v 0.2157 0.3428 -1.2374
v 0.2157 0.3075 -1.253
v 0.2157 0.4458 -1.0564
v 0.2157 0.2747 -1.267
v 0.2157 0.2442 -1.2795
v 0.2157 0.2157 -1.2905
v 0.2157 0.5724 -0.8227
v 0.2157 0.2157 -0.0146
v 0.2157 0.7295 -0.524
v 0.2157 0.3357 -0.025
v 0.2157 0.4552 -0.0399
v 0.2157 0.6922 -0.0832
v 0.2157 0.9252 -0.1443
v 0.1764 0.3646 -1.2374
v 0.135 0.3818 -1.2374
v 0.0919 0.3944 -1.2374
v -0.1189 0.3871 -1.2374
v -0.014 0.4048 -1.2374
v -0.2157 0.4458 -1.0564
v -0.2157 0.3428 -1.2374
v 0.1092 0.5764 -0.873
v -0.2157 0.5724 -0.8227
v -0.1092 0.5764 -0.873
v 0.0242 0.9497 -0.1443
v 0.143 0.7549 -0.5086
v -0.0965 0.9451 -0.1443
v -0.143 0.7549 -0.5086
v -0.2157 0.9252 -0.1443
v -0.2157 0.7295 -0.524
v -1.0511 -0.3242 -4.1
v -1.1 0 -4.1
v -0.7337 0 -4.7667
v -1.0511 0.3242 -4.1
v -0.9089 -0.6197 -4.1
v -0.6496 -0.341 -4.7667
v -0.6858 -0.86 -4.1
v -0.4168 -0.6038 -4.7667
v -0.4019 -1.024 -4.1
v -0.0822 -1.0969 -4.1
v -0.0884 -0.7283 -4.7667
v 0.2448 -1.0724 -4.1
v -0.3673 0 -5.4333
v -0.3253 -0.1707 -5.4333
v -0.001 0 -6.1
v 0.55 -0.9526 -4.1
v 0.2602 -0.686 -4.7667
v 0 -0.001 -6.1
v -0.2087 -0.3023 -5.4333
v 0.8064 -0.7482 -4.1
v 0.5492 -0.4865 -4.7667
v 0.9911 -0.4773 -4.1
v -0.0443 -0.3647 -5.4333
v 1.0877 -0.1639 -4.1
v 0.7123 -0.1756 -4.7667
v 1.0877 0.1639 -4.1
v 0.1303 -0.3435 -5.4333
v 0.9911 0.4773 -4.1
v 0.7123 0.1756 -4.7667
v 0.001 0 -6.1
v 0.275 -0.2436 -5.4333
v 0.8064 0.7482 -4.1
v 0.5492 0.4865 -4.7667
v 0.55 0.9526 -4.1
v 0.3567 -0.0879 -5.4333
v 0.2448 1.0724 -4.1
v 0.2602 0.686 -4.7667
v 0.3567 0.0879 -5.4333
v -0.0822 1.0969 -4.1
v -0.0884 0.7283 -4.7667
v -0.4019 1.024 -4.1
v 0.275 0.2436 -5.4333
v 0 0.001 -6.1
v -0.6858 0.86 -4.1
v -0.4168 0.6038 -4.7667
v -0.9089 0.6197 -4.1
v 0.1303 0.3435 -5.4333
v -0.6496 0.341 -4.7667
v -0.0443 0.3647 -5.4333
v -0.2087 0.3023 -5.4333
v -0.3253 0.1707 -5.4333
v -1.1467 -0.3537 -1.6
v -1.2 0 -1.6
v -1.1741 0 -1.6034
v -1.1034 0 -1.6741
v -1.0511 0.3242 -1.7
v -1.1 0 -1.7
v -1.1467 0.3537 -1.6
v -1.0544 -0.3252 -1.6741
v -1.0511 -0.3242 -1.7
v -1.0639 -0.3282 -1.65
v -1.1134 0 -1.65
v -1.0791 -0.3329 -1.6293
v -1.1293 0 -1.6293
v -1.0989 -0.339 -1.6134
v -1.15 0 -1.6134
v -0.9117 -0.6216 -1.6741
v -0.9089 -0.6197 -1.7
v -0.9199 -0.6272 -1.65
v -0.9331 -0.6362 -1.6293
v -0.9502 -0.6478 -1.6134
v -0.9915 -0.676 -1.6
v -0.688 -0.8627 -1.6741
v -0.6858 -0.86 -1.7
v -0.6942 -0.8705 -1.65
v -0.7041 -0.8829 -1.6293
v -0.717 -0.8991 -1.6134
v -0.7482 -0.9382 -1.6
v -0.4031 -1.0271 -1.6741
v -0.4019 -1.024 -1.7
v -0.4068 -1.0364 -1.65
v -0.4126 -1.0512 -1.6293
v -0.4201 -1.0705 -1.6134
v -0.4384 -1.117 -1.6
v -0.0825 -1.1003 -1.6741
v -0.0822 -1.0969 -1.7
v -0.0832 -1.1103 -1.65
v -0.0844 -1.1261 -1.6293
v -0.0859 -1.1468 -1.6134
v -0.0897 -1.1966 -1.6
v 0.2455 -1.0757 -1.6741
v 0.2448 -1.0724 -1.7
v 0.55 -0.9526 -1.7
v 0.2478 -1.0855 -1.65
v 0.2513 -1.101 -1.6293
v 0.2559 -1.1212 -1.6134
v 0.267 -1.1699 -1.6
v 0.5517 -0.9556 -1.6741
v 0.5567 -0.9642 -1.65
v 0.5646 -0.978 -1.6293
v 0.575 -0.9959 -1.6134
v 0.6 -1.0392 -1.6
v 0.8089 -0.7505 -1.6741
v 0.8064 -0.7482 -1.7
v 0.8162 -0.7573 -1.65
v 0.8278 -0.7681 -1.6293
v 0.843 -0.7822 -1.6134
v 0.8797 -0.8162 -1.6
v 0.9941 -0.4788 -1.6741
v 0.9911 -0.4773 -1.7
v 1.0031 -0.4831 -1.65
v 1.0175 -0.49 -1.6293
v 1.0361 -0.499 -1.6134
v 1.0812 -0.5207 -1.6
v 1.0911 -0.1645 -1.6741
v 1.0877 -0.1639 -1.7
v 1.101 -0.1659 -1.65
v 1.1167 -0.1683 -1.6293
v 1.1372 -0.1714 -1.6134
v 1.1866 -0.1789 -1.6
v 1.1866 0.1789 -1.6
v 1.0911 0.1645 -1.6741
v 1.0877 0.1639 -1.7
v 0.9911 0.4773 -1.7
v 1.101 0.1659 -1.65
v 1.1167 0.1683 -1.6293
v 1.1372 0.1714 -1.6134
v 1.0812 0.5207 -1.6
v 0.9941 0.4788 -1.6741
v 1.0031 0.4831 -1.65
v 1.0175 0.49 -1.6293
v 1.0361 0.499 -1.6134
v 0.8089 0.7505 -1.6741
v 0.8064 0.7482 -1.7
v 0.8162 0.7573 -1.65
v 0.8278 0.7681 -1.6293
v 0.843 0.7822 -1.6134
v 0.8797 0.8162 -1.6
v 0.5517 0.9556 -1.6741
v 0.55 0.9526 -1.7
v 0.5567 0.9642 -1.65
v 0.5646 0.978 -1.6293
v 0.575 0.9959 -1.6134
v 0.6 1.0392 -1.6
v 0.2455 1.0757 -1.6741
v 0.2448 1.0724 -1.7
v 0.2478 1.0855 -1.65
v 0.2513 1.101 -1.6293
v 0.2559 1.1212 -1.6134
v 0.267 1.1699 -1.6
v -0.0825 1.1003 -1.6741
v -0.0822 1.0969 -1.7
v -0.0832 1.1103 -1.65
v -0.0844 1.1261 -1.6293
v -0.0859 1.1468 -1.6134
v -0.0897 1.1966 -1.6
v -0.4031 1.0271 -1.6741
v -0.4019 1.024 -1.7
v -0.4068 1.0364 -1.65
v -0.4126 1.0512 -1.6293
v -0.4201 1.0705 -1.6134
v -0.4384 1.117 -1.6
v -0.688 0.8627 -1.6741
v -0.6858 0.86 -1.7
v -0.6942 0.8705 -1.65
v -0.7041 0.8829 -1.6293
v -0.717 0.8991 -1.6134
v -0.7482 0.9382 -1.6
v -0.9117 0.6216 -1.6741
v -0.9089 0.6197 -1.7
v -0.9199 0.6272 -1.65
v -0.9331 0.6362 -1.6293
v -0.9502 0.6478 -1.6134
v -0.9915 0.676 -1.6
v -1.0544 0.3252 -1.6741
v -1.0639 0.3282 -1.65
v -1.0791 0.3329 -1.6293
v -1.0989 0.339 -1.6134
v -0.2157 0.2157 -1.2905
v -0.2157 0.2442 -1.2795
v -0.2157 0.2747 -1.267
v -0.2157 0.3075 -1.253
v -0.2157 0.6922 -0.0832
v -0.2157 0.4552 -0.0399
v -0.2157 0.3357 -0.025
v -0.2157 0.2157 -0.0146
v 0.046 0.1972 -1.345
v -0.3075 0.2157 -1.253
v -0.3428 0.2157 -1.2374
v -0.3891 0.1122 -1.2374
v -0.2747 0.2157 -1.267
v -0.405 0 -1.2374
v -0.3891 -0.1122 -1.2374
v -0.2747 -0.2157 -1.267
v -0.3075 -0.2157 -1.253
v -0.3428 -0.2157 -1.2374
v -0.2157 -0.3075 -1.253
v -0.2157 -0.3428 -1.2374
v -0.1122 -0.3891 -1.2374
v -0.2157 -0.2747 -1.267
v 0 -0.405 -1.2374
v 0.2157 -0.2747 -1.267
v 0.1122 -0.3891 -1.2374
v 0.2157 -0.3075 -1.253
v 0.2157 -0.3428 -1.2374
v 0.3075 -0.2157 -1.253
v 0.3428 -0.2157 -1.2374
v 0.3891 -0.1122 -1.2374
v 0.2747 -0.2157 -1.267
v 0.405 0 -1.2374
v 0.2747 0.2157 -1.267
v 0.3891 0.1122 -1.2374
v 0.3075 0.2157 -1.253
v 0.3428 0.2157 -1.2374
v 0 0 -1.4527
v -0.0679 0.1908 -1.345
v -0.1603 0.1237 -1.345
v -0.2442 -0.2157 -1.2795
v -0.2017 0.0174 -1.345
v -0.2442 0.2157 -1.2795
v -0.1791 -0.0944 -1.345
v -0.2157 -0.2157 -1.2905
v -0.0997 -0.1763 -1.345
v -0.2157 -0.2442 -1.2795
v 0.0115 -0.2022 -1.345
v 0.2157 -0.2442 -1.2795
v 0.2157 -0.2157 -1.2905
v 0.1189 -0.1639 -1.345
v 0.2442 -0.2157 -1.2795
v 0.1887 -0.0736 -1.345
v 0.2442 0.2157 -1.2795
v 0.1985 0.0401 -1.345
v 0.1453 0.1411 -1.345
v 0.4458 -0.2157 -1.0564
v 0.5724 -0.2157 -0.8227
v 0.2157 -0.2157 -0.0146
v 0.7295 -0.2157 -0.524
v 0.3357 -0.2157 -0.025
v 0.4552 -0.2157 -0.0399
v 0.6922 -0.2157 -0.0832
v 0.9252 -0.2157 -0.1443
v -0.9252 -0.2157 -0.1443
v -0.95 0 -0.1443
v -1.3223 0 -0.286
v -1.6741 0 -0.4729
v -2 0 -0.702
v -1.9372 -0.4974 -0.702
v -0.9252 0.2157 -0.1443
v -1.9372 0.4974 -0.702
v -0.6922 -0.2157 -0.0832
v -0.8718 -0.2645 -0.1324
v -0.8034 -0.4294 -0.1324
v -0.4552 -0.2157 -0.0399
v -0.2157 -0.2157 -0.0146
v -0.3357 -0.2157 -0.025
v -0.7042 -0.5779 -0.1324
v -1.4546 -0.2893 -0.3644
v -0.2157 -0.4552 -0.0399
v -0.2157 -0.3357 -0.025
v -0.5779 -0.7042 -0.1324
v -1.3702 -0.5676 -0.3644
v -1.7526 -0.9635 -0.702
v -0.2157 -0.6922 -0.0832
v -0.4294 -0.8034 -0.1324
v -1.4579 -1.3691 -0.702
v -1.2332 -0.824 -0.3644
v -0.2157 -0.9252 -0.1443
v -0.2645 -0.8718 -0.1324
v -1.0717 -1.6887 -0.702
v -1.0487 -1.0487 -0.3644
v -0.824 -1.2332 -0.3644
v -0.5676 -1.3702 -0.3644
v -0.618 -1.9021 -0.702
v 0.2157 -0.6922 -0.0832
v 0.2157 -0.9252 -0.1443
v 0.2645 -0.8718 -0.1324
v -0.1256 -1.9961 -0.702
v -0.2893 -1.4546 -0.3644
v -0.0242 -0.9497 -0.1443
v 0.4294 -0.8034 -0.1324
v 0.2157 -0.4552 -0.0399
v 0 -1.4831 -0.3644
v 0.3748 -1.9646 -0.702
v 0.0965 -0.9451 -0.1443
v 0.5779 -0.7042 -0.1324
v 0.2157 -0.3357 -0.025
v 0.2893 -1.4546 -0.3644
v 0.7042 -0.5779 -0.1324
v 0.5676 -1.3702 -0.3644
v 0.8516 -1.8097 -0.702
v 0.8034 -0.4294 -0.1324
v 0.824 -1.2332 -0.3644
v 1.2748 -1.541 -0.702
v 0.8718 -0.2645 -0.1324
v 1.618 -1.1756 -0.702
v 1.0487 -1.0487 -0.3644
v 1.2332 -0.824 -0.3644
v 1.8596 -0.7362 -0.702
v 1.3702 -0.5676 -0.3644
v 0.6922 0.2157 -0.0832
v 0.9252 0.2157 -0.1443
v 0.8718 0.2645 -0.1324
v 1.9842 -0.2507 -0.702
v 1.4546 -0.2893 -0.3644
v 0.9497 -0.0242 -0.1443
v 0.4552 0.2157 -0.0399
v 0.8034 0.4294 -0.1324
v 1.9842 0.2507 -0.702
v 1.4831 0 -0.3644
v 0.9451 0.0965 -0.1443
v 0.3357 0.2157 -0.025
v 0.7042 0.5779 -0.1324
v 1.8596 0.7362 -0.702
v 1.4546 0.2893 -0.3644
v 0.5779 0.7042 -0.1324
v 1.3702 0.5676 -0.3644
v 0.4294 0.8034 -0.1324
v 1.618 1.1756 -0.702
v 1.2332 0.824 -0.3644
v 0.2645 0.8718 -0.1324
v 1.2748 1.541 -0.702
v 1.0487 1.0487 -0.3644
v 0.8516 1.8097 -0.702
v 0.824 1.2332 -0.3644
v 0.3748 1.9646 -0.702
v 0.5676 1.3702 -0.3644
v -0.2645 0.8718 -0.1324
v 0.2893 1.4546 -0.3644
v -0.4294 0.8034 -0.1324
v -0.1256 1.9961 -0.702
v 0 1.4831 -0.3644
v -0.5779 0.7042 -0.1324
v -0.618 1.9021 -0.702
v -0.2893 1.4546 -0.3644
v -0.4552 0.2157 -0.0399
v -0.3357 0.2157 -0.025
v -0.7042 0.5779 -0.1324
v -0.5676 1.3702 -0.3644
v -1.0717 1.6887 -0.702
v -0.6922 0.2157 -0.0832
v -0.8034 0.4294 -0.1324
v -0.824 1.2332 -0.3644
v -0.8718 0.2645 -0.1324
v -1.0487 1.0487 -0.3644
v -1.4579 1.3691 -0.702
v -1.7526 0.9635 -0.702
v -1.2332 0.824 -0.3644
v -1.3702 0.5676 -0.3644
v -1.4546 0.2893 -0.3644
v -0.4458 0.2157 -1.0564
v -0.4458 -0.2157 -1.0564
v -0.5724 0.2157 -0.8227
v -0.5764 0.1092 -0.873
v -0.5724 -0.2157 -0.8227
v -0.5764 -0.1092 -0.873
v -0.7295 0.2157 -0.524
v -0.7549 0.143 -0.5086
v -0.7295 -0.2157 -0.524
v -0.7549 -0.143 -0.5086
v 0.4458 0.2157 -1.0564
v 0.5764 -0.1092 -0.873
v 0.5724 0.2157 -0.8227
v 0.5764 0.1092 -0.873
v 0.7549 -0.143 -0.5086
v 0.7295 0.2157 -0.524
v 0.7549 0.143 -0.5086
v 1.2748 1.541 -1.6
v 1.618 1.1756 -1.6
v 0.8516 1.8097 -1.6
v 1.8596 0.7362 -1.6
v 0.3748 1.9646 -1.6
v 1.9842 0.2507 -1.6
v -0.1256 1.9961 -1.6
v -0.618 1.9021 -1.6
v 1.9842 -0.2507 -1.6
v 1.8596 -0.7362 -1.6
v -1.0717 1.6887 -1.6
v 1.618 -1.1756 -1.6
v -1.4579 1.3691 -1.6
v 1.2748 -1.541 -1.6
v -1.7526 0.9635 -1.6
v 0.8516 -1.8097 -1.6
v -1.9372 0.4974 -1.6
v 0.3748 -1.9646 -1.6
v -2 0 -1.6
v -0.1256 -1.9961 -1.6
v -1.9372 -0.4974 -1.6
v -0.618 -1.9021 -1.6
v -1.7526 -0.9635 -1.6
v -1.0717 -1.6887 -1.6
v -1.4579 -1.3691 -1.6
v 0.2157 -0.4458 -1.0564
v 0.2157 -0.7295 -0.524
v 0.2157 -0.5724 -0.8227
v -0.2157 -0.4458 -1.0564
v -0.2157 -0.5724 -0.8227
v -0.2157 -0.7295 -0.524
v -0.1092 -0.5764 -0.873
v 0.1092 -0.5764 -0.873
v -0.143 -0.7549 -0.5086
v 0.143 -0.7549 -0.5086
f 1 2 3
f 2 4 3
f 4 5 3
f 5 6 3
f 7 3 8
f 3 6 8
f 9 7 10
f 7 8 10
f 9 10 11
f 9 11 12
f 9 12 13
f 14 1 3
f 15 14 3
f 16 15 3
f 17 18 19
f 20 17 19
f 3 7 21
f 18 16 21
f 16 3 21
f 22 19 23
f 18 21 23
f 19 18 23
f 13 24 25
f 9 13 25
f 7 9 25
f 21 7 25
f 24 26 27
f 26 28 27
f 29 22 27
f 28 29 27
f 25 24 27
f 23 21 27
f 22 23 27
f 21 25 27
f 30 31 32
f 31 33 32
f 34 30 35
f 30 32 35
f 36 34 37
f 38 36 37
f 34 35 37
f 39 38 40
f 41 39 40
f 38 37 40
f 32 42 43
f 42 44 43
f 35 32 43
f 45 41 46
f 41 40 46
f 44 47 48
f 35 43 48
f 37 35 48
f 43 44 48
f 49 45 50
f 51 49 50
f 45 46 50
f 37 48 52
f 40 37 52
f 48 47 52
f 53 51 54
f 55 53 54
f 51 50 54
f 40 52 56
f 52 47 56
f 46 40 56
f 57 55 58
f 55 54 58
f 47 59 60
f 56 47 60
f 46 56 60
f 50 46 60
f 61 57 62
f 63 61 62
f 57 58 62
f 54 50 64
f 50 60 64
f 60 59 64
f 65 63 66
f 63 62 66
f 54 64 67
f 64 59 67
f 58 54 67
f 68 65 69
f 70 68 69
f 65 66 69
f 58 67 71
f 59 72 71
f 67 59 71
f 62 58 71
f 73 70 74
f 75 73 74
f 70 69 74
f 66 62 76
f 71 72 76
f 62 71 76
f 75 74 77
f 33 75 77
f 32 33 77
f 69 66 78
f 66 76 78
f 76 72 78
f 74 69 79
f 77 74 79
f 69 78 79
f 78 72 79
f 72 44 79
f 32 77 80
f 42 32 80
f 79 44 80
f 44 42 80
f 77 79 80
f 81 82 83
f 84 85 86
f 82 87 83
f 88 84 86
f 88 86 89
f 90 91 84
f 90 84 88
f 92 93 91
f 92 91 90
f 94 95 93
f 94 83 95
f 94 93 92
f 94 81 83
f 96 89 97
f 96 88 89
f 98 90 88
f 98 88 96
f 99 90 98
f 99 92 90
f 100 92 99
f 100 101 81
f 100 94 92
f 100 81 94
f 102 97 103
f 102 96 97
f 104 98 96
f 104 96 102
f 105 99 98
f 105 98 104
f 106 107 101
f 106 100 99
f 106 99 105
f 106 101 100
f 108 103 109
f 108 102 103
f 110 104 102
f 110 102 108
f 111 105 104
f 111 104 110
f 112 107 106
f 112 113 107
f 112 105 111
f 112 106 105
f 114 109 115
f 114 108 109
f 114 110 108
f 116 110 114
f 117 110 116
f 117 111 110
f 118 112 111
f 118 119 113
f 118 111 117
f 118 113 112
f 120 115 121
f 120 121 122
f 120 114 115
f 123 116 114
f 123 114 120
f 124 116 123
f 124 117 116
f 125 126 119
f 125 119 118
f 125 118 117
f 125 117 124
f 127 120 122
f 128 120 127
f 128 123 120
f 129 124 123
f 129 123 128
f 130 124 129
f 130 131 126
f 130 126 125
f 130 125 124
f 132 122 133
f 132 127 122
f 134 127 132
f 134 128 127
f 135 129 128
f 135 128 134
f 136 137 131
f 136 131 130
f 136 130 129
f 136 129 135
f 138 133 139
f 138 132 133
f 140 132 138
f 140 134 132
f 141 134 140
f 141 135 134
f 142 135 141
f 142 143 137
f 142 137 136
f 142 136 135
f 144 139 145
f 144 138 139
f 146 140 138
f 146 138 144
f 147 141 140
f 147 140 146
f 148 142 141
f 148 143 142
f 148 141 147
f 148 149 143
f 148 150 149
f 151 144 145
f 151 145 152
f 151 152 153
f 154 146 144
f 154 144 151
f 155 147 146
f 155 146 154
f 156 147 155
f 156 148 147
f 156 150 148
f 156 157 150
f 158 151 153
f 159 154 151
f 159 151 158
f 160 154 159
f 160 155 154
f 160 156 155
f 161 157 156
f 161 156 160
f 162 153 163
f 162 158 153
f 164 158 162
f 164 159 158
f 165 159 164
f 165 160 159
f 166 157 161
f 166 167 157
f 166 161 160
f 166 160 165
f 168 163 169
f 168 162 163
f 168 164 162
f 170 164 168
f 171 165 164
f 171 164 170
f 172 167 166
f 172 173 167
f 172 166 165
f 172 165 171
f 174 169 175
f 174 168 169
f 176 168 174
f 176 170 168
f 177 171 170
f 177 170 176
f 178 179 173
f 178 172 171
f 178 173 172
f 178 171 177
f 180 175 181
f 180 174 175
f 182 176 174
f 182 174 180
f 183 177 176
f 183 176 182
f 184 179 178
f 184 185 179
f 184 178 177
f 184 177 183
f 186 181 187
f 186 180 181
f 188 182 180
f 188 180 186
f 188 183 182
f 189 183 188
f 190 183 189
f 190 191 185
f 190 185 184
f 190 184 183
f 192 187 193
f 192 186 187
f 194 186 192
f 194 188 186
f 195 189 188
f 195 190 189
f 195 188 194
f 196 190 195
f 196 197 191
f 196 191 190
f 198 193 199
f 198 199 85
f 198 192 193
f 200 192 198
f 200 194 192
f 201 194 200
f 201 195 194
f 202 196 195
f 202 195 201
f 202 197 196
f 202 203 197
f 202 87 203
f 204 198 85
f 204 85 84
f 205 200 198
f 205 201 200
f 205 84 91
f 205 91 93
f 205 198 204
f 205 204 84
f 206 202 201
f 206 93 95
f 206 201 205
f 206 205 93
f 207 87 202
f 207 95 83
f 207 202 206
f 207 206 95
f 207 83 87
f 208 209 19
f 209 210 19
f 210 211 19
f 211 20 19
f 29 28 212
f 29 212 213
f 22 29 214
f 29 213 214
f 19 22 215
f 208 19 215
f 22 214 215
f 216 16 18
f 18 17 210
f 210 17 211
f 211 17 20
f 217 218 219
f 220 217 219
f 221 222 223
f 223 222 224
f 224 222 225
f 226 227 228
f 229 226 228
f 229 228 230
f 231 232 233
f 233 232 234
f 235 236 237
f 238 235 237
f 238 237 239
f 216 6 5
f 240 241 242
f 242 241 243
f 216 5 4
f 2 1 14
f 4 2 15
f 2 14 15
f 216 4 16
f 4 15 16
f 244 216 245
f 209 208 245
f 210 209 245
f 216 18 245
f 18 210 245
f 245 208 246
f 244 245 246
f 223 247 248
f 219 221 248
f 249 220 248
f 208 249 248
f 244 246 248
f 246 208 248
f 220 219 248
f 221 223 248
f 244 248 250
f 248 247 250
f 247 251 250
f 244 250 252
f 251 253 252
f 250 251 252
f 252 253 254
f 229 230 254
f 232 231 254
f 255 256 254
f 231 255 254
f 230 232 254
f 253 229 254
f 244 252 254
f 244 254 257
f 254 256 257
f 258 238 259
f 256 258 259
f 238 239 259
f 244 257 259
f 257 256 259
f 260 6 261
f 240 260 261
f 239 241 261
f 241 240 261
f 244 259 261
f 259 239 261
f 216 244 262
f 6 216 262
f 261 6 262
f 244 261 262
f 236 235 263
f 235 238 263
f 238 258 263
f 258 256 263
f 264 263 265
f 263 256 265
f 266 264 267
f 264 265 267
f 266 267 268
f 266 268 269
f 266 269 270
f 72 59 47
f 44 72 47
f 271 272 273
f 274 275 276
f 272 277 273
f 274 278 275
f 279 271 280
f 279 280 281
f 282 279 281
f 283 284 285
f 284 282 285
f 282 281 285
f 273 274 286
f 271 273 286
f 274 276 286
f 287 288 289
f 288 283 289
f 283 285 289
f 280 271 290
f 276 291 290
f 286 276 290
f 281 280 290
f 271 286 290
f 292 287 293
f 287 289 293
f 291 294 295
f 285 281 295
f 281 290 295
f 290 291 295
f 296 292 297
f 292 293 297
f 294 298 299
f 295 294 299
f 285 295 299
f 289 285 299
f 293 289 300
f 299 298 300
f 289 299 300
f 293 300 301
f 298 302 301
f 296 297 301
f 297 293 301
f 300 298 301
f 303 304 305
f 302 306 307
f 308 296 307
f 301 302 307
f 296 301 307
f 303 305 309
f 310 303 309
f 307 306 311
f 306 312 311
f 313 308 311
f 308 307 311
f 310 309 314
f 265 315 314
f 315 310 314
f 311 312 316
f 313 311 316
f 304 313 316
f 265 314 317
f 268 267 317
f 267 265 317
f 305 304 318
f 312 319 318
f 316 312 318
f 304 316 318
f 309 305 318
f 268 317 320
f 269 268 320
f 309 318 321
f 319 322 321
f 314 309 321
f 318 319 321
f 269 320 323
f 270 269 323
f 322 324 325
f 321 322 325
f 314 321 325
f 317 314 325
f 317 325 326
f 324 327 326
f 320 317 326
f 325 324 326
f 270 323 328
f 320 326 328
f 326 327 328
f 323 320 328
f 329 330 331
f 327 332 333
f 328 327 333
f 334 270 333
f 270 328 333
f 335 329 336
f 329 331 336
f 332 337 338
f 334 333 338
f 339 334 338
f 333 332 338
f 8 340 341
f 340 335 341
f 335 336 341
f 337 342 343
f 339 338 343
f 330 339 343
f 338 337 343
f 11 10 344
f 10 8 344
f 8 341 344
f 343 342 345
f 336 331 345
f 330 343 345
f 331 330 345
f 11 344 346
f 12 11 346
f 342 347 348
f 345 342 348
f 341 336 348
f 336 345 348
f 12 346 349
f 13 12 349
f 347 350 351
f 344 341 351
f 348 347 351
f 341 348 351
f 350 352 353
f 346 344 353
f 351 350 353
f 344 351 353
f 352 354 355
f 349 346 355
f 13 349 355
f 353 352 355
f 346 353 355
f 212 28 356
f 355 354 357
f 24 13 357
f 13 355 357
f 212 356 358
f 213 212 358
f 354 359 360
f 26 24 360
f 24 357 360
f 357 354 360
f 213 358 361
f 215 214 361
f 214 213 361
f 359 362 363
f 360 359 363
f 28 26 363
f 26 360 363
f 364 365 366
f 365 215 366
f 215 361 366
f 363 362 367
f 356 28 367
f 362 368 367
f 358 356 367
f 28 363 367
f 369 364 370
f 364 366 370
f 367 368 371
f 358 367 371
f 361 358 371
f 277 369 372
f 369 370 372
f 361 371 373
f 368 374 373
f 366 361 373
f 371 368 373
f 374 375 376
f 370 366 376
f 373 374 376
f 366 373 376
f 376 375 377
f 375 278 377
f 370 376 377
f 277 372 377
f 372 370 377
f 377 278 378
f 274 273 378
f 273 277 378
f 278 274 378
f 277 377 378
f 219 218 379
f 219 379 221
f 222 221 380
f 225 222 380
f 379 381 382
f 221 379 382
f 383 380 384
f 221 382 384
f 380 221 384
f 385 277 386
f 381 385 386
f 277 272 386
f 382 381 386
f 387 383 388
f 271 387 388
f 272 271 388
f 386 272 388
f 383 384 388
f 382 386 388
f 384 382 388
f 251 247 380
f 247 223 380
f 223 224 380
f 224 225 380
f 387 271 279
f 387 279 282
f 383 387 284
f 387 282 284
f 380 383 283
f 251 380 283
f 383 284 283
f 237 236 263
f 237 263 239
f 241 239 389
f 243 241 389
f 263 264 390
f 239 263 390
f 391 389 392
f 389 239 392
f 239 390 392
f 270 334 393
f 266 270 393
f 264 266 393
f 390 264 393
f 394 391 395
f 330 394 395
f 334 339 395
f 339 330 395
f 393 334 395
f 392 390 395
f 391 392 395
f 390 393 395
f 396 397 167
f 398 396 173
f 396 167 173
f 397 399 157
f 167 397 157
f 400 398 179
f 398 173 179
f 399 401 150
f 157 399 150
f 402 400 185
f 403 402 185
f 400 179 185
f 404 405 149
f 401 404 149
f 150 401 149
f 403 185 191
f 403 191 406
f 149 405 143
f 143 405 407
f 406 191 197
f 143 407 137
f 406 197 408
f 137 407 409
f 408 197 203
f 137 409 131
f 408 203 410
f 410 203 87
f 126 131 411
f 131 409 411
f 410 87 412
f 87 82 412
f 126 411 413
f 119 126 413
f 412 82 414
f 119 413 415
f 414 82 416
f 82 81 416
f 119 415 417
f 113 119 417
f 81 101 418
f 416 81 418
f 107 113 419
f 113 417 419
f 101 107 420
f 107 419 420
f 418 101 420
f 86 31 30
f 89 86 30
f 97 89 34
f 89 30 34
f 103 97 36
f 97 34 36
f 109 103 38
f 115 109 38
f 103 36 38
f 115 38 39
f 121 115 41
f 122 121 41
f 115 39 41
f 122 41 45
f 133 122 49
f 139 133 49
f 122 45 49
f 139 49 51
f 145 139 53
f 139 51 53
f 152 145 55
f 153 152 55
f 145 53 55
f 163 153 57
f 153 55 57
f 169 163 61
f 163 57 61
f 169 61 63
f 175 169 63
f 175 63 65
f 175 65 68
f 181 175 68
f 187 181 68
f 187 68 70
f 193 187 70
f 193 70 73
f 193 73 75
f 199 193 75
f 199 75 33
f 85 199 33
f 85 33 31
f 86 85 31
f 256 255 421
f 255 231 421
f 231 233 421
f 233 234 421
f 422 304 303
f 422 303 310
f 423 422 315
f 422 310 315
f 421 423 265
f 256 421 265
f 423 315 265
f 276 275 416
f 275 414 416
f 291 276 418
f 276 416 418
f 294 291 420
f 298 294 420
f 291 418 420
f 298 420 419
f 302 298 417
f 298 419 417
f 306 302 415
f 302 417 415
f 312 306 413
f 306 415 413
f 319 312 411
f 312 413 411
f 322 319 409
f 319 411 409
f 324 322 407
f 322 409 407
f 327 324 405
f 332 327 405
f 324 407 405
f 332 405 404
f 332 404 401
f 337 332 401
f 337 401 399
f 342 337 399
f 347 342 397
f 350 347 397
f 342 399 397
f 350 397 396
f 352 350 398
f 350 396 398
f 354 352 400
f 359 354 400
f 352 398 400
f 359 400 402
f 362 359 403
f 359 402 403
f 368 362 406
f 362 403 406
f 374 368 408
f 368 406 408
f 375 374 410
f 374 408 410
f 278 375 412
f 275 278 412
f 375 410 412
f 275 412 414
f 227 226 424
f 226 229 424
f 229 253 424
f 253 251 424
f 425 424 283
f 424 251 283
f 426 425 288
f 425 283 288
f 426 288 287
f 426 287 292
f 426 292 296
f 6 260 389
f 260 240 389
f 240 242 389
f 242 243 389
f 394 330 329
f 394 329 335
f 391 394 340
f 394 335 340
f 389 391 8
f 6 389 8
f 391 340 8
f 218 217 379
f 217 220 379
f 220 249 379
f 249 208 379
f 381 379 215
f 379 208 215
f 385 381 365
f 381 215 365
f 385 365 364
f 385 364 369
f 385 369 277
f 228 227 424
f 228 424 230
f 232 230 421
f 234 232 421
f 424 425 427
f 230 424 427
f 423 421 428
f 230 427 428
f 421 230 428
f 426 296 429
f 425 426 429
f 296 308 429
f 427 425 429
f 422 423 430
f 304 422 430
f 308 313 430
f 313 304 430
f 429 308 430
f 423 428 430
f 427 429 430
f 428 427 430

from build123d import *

# Parameters (mm, degrees)
SLOT_DEPTH        = 1.9
CIRPATTERN1_COUNT = 4
CHAMFER1_SIZE     = 2
CHAMFER1_SIZE2    = 1.099
FILLET1_R         = 0.1


with BuildPart() as part:
    # Sketch1 → BaseBody (revolve)
    with BuildSketch(Plane(origin=(0, 0, 0), x_dir=(0, 0, -1), z_dir=(1, 0, 0)), mode=Mode.PRIVATE) as basebody_sk:
        with BuildLine():
            Line((0.702000801, 2), (1.6, 2))
            Line((1.6, 2), (1.6, 1.1))
            Line((1.6, 1.1), (6.1, 1.1))
            Line((6.1, 1.1), (6.1, 0))
            Line((6.1, 0), (0, 0))
            ThreePointArc((0, 0), (0.180596297, 1.059811908), (0.702000801, 2))
        make_face()
    revolve(basebody_sk.sketch.rotate(Axis((0, 0, -104.616192041), (0, 0, 1)), 90), axis=Axis((0, 0, -104.616192041), (0, 0, 1)))

    # Sketch2 → Slot (cut)
    with BuildSketch(Plane.XY):
        with BuildLine():
            Line((-0.215667568, 0.925195925), (-0.215667568, 0))
            Line((-0.215667568, 0), (0.215667568, 0))
            Line((0.215667568, 0), (0.215667568, 0.925195925))
            ThreePointArc((0.215667568, 0.925195925), (0, 0.95), (-0.215667568, 0.925195925))
        make_face()
    slot = extrude(amount=-SLOT_DEPTH, mode=Mode.SUBTRACT)

    # CirPattern1: Slot ×4 about axis
    cirpattern1_axis = Axis((0, 0, 0), (0, 0, 1))
    for i in range(1, CIRPATTERN1_COUNT):
        add(slot.rotate(cirpattern1_axis, i * 360 / CIRPATTERN1_COUNT), mode=Mode.SUBTRACT)

    # Sketch4 → BaseBodySlot (revolve)
    with BuildSketch(Plane(origin=(0, 0, 0), x_dir=(0, 0, -1), z_dir=(1, 0, 0)), mode=Mode.PRIVATE) as basebodyslot_sk:
        with BuildLine():
            Line((0.625121362, 1.9), (1.6, 1.9))
            Line((1.6, 1.9), (1.6, 1.1))
            Line((1.6, 1.1), (1.91, 1.1))
            Line((1.91, 1.1), (1.91, 0))
            Line((1.91, 0), (1.452710893, 0))
            Line((1.452710893, 0), (1.237368573, 0.405))
            Line((1.237368573, 0.405), (0.144267682, 0.95))
            ThreePointArc((0.144267682, 0.95), (0.344904566, 1.445140154), (0.625121362, 1.9))
        make_face()
    revolve(basebodyslot_sk.sketch.rotate(Axis((0, 0, -5.068214653), (0, 0, 1)), 346.878398747), axis=Axis((0, 0, -5.068214653), (0, 0, 1)))

    # Chamfer1
    chamfer1_edges = [part.edges().sort_by_distance(p)[0] for p in [
        (1.1, 0, -6.1),
    ]]
    chamfer1_side = [part.faces().sort_by_distance(p)[0] for p in [
        (1.1, 0, -3.85),
    ]]
    chamfer(chamfer1_edges, length=CHAMFER1_SIZE, length2=CHAMFER1_SIZE2, reference=chamfer1_side[0])

    # Fillet1
    fillet1_edges = [part.edges().sort_by_distance(p)[0] for p in [
        (1.1, 0, -1.6),
    ]]
    fillet(fillet1_edges, radius=FILLET1_R)


solid = part.part
